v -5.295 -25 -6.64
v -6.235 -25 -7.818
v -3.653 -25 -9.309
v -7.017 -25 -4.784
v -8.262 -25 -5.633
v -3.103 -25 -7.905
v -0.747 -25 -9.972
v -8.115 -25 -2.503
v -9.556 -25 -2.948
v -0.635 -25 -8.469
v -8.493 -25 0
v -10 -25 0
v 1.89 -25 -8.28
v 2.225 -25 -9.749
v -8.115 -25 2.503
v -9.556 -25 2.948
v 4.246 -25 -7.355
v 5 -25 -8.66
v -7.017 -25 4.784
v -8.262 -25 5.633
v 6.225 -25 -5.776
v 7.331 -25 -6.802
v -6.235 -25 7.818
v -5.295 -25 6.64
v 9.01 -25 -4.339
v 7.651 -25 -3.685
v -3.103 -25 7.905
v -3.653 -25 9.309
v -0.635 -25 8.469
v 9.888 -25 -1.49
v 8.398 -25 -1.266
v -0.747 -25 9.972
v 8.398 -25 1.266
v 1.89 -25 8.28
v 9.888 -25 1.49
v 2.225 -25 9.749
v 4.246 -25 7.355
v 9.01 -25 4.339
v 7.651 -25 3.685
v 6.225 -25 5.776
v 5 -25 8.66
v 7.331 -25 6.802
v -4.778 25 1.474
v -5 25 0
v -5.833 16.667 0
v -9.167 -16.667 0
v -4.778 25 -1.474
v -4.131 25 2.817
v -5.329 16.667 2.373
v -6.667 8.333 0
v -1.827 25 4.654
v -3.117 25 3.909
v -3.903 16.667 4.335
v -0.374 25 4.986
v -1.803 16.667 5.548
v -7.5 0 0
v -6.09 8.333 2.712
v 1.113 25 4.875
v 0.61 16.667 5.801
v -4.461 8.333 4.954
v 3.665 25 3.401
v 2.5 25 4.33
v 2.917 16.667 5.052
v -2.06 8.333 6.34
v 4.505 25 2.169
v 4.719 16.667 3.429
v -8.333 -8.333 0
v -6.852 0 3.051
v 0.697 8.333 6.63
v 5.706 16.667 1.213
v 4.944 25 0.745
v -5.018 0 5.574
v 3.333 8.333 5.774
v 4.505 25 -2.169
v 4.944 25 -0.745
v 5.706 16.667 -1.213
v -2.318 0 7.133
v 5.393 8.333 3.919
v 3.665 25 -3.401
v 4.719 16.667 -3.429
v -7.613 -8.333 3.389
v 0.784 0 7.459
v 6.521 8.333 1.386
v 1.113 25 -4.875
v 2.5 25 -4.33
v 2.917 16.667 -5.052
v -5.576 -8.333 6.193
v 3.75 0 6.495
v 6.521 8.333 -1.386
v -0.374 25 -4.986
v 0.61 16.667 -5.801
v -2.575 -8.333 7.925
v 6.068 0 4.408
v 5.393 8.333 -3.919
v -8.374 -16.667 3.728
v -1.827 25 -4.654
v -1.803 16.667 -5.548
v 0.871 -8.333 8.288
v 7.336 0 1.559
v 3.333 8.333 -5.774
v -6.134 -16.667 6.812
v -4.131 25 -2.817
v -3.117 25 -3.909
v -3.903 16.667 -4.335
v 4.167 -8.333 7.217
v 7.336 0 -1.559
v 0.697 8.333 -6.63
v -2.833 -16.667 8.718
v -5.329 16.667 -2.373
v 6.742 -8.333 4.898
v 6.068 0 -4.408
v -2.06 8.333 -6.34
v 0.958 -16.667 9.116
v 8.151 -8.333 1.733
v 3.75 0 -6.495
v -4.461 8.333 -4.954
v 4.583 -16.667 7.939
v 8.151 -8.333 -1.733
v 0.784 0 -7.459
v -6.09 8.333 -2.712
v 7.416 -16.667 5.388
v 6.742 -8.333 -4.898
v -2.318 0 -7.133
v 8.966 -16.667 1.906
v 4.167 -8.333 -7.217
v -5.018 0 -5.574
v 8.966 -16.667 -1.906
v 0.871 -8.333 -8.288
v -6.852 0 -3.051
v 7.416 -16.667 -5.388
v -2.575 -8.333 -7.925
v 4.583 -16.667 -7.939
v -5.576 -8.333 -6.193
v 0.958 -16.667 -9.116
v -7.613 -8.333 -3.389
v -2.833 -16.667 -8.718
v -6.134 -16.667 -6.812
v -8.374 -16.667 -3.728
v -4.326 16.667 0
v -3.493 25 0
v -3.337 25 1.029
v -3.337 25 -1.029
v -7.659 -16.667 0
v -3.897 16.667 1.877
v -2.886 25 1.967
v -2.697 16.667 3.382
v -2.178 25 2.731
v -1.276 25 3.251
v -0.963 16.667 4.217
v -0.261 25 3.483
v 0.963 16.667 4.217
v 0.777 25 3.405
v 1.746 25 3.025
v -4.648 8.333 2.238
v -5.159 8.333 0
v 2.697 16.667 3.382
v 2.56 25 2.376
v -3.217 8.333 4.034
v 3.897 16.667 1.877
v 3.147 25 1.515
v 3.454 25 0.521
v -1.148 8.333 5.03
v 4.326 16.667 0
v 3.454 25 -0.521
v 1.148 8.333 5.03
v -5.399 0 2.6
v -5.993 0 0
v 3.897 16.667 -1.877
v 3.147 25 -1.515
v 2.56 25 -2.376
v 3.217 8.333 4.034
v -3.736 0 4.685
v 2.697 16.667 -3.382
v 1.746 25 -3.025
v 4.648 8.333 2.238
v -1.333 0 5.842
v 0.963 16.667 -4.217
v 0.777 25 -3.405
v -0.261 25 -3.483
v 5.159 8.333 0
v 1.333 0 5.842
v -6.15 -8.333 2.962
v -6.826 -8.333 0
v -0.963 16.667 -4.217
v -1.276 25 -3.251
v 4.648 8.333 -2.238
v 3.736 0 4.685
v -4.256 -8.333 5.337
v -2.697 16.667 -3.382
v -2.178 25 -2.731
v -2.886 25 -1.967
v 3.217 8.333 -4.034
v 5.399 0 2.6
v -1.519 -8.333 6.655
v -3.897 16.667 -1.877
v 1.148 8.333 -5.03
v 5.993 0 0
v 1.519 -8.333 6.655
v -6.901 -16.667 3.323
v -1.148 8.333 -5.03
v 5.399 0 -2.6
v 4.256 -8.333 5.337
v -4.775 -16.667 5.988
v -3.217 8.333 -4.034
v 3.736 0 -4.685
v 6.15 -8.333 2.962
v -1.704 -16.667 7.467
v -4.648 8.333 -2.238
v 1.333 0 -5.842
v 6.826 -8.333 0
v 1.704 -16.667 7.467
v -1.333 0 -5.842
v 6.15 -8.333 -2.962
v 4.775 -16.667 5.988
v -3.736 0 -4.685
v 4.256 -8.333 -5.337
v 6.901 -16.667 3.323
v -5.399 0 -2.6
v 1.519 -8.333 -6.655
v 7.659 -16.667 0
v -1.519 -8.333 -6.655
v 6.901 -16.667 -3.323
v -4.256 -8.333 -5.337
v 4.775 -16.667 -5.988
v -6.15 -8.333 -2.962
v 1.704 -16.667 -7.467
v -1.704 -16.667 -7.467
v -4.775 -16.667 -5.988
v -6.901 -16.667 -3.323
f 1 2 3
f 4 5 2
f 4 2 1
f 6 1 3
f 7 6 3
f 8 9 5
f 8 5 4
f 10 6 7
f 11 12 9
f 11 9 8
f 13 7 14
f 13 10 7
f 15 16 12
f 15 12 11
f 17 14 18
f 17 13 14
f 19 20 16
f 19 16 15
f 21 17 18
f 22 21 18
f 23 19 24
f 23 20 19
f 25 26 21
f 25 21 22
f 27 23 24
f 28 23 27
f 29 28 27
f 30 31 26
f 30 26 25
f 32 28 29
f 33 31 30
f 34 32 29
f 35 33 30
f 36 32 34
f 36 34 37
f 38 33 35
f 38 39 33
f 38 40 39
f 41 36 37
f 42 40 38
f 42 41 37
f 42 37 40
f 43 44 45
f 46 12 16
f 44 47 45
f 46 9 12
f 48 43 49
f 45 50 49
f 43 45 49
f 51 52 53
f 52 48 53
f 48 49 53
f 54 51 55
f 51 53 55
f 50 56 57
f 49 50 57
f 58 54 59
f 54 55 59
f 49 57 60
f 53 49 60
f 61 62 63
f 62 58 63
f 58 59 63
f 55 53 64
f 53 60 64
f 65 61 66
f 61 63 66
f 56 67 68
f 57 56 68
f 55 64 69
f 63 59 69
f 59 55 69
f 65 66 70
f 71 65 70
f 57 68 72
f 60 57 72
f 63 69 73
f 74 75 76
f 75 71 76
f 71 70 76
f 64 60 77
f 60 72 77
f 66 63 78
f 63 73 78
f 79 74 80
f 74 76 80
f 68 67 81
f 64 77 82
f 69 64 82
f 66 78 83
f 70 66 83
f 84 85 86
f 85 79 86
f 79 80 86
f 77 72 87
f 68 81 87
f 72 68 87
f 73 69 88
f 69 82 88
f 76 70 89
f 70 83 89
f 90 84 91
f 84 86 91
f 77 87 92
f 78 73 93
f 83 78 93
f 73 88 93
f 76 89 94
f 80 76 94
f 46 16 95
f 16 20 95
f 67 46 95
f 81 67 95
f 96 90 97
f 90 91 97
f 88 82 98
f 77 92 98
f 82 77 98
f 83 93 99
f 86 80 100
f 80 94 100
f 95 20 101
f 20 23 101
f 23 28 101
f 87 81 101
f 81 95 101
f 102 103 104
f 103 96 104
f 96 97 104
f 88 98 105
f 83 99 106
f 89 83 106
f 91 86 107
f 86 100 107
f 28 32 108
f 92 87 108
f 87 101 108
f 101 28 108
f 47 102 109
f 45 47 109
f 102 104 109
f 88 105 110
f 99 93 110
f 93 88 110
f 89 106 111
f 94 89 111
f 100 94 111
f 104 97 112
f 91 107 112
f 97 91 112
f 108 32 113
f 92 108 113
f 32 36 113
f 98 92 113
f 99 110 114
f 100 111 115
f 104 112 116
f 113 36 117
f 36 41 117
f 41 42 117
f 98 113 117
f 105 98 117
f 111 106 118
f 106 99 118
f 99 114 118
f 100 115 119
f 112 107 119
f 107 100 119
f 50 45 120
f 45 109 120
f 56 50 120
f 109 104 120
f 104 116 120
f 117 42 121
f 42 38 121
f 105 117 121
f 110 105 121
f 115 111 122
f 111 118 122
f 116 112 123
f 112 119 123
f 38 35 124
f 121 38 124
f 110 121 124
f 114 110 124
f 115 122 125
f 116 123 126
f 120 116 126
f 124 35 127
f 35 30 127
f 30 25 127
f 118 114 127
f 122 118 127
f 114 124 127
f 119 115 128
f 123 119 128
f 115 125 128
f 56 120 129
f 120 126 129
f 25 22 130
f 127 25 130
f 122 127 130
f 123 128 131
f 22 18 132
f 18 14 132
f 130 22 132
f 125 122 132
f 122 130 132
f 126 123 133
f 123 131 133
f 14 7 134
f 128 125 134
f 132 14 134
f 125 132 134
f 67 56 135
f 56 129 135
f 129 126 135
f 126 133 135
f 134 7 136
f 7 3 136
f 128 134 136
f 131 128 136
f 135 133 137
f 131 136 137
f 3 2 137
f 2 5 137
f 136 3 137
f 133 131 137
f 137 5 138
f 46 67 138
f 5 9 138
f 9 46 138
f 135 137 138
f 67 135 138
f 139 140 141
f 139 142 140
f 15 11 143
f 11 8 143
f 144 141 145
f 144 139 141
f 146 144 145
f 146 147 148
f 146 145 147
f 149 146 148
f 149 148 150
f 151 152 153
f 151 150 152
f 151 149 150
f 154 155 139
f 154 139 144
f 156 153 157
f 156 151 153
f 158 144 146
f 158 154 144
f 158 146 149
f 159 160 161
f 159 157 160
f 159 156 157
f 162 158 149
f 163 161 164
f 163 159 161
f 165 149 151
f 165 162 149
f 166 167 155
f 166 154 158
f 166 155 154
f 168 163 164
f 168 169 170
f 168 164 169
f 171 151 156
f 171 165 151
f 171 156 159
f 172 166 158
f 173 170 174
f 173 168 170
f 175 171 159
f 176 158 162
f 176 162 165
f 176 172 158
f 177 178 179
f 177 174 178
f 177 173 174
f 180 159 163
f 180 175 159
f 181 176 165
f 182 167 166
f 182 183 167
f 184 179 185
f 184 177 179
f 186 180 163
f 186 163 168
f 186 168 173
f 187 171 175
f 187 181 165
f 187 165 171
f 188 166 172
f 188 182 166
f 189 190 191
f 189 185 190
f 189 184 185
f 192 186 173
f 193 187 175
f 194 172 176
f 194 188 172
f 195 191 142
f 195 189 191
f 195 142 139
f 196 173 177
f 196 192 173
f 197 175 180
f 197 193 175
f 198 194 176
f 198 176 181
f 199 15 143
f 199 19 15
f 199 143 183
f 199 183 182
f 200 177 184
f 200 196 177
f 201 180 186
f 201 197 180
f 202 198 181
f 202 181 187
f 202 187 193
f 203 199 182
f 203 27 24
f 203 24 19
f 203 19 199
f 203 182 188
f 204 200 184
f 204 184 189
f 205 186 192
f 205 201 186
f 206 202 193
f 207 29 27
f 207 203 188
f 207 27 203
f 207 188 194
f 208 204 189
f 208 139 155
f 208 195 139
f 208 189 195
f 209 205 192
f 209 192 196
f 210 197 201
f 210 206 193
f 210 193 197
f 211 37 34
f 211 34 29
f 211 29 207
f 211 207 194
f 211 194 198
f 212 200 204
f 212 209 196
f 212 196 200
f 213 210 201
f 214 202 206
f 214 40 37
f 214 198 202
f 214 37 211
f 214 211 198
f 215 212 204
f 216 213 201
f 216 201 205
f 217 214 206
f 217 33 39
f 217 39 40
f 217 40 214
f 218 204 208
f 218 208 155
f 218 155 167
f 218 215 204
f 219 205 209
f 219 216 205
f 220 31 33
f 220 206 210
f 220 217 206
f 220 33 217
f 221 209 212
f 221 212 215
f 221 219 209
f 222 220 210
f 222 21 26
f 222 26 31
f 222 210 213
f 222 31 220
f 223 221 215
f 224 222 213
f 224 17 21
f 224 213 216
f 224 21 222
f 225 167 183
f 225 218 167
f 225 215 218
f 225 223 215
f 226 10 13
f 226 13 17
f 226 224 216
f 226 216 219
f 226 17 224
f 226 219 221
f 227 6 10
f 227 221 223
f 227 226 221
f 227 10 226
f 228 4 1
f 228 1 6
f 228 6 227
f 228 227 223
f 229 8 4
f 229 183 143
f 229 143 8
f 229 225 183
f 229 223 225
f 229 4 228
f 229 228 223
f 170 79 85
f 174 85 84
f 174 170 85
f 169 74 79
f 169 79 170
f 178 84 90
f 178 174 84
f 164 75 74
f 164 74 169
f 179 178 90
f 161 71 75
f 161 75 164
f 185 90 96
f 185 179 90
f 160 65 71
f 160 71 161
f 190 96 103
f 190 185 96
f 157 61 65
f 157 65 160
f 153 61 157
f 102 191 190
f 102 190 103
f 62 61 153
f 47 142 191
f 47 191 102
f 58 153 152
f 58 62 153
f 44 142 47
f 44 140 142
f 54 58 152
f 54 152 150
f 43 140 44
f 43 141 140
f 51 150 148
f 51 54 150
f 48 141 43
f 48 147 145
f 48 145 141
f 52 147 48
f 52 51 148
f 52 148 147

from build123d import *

# Parameters (mm, degrees)
F0_R       = 10
F1_DEPTH   = 25
F2_DEPTH   = 25
F3_R       = 5
F1_FACE1_R = 10
F5_T       = -1.5


with BuildPart() as f1:
    # F0 (on Front) → F1 (new body)
    with BuildSketch(Plane.XZ):
        Circle(F0_R)
    extrude(amount=F1_DEPTH)

    # F2 (add): a face of the model
    f2_faces = [f1.faces().sort_by_distance(p)[0] for p in [
        (0, 0, 0),
    ]]
    extrude(f2_faces, amount=F2_DEPTH)

    # F3 (on face) → F4 section 0
    with BuildSketch(Plane(origin=(0, 25, 0), x_dir=(-1, 0, 0), z_dir=(0, 1, 0))):
        Circle(F3_R)
    # F1_face1 (on face) → F4 section 1
    with BuildSketch(Plane.XZ.offset(25)):
        Circle(F1_FACE1_R)
    loft(mode=Mode.INTERSECT)

    # F5
    f5_openings = [f1.faces().sort_by_distance(p)[0] for p in [
        (0, -25, 0),
        (0, 25, 0),
    ]]
    offset(amount=F5_T, openings=f5_openings, kind=Kind.INTERSECTION)


solid = f1.part
